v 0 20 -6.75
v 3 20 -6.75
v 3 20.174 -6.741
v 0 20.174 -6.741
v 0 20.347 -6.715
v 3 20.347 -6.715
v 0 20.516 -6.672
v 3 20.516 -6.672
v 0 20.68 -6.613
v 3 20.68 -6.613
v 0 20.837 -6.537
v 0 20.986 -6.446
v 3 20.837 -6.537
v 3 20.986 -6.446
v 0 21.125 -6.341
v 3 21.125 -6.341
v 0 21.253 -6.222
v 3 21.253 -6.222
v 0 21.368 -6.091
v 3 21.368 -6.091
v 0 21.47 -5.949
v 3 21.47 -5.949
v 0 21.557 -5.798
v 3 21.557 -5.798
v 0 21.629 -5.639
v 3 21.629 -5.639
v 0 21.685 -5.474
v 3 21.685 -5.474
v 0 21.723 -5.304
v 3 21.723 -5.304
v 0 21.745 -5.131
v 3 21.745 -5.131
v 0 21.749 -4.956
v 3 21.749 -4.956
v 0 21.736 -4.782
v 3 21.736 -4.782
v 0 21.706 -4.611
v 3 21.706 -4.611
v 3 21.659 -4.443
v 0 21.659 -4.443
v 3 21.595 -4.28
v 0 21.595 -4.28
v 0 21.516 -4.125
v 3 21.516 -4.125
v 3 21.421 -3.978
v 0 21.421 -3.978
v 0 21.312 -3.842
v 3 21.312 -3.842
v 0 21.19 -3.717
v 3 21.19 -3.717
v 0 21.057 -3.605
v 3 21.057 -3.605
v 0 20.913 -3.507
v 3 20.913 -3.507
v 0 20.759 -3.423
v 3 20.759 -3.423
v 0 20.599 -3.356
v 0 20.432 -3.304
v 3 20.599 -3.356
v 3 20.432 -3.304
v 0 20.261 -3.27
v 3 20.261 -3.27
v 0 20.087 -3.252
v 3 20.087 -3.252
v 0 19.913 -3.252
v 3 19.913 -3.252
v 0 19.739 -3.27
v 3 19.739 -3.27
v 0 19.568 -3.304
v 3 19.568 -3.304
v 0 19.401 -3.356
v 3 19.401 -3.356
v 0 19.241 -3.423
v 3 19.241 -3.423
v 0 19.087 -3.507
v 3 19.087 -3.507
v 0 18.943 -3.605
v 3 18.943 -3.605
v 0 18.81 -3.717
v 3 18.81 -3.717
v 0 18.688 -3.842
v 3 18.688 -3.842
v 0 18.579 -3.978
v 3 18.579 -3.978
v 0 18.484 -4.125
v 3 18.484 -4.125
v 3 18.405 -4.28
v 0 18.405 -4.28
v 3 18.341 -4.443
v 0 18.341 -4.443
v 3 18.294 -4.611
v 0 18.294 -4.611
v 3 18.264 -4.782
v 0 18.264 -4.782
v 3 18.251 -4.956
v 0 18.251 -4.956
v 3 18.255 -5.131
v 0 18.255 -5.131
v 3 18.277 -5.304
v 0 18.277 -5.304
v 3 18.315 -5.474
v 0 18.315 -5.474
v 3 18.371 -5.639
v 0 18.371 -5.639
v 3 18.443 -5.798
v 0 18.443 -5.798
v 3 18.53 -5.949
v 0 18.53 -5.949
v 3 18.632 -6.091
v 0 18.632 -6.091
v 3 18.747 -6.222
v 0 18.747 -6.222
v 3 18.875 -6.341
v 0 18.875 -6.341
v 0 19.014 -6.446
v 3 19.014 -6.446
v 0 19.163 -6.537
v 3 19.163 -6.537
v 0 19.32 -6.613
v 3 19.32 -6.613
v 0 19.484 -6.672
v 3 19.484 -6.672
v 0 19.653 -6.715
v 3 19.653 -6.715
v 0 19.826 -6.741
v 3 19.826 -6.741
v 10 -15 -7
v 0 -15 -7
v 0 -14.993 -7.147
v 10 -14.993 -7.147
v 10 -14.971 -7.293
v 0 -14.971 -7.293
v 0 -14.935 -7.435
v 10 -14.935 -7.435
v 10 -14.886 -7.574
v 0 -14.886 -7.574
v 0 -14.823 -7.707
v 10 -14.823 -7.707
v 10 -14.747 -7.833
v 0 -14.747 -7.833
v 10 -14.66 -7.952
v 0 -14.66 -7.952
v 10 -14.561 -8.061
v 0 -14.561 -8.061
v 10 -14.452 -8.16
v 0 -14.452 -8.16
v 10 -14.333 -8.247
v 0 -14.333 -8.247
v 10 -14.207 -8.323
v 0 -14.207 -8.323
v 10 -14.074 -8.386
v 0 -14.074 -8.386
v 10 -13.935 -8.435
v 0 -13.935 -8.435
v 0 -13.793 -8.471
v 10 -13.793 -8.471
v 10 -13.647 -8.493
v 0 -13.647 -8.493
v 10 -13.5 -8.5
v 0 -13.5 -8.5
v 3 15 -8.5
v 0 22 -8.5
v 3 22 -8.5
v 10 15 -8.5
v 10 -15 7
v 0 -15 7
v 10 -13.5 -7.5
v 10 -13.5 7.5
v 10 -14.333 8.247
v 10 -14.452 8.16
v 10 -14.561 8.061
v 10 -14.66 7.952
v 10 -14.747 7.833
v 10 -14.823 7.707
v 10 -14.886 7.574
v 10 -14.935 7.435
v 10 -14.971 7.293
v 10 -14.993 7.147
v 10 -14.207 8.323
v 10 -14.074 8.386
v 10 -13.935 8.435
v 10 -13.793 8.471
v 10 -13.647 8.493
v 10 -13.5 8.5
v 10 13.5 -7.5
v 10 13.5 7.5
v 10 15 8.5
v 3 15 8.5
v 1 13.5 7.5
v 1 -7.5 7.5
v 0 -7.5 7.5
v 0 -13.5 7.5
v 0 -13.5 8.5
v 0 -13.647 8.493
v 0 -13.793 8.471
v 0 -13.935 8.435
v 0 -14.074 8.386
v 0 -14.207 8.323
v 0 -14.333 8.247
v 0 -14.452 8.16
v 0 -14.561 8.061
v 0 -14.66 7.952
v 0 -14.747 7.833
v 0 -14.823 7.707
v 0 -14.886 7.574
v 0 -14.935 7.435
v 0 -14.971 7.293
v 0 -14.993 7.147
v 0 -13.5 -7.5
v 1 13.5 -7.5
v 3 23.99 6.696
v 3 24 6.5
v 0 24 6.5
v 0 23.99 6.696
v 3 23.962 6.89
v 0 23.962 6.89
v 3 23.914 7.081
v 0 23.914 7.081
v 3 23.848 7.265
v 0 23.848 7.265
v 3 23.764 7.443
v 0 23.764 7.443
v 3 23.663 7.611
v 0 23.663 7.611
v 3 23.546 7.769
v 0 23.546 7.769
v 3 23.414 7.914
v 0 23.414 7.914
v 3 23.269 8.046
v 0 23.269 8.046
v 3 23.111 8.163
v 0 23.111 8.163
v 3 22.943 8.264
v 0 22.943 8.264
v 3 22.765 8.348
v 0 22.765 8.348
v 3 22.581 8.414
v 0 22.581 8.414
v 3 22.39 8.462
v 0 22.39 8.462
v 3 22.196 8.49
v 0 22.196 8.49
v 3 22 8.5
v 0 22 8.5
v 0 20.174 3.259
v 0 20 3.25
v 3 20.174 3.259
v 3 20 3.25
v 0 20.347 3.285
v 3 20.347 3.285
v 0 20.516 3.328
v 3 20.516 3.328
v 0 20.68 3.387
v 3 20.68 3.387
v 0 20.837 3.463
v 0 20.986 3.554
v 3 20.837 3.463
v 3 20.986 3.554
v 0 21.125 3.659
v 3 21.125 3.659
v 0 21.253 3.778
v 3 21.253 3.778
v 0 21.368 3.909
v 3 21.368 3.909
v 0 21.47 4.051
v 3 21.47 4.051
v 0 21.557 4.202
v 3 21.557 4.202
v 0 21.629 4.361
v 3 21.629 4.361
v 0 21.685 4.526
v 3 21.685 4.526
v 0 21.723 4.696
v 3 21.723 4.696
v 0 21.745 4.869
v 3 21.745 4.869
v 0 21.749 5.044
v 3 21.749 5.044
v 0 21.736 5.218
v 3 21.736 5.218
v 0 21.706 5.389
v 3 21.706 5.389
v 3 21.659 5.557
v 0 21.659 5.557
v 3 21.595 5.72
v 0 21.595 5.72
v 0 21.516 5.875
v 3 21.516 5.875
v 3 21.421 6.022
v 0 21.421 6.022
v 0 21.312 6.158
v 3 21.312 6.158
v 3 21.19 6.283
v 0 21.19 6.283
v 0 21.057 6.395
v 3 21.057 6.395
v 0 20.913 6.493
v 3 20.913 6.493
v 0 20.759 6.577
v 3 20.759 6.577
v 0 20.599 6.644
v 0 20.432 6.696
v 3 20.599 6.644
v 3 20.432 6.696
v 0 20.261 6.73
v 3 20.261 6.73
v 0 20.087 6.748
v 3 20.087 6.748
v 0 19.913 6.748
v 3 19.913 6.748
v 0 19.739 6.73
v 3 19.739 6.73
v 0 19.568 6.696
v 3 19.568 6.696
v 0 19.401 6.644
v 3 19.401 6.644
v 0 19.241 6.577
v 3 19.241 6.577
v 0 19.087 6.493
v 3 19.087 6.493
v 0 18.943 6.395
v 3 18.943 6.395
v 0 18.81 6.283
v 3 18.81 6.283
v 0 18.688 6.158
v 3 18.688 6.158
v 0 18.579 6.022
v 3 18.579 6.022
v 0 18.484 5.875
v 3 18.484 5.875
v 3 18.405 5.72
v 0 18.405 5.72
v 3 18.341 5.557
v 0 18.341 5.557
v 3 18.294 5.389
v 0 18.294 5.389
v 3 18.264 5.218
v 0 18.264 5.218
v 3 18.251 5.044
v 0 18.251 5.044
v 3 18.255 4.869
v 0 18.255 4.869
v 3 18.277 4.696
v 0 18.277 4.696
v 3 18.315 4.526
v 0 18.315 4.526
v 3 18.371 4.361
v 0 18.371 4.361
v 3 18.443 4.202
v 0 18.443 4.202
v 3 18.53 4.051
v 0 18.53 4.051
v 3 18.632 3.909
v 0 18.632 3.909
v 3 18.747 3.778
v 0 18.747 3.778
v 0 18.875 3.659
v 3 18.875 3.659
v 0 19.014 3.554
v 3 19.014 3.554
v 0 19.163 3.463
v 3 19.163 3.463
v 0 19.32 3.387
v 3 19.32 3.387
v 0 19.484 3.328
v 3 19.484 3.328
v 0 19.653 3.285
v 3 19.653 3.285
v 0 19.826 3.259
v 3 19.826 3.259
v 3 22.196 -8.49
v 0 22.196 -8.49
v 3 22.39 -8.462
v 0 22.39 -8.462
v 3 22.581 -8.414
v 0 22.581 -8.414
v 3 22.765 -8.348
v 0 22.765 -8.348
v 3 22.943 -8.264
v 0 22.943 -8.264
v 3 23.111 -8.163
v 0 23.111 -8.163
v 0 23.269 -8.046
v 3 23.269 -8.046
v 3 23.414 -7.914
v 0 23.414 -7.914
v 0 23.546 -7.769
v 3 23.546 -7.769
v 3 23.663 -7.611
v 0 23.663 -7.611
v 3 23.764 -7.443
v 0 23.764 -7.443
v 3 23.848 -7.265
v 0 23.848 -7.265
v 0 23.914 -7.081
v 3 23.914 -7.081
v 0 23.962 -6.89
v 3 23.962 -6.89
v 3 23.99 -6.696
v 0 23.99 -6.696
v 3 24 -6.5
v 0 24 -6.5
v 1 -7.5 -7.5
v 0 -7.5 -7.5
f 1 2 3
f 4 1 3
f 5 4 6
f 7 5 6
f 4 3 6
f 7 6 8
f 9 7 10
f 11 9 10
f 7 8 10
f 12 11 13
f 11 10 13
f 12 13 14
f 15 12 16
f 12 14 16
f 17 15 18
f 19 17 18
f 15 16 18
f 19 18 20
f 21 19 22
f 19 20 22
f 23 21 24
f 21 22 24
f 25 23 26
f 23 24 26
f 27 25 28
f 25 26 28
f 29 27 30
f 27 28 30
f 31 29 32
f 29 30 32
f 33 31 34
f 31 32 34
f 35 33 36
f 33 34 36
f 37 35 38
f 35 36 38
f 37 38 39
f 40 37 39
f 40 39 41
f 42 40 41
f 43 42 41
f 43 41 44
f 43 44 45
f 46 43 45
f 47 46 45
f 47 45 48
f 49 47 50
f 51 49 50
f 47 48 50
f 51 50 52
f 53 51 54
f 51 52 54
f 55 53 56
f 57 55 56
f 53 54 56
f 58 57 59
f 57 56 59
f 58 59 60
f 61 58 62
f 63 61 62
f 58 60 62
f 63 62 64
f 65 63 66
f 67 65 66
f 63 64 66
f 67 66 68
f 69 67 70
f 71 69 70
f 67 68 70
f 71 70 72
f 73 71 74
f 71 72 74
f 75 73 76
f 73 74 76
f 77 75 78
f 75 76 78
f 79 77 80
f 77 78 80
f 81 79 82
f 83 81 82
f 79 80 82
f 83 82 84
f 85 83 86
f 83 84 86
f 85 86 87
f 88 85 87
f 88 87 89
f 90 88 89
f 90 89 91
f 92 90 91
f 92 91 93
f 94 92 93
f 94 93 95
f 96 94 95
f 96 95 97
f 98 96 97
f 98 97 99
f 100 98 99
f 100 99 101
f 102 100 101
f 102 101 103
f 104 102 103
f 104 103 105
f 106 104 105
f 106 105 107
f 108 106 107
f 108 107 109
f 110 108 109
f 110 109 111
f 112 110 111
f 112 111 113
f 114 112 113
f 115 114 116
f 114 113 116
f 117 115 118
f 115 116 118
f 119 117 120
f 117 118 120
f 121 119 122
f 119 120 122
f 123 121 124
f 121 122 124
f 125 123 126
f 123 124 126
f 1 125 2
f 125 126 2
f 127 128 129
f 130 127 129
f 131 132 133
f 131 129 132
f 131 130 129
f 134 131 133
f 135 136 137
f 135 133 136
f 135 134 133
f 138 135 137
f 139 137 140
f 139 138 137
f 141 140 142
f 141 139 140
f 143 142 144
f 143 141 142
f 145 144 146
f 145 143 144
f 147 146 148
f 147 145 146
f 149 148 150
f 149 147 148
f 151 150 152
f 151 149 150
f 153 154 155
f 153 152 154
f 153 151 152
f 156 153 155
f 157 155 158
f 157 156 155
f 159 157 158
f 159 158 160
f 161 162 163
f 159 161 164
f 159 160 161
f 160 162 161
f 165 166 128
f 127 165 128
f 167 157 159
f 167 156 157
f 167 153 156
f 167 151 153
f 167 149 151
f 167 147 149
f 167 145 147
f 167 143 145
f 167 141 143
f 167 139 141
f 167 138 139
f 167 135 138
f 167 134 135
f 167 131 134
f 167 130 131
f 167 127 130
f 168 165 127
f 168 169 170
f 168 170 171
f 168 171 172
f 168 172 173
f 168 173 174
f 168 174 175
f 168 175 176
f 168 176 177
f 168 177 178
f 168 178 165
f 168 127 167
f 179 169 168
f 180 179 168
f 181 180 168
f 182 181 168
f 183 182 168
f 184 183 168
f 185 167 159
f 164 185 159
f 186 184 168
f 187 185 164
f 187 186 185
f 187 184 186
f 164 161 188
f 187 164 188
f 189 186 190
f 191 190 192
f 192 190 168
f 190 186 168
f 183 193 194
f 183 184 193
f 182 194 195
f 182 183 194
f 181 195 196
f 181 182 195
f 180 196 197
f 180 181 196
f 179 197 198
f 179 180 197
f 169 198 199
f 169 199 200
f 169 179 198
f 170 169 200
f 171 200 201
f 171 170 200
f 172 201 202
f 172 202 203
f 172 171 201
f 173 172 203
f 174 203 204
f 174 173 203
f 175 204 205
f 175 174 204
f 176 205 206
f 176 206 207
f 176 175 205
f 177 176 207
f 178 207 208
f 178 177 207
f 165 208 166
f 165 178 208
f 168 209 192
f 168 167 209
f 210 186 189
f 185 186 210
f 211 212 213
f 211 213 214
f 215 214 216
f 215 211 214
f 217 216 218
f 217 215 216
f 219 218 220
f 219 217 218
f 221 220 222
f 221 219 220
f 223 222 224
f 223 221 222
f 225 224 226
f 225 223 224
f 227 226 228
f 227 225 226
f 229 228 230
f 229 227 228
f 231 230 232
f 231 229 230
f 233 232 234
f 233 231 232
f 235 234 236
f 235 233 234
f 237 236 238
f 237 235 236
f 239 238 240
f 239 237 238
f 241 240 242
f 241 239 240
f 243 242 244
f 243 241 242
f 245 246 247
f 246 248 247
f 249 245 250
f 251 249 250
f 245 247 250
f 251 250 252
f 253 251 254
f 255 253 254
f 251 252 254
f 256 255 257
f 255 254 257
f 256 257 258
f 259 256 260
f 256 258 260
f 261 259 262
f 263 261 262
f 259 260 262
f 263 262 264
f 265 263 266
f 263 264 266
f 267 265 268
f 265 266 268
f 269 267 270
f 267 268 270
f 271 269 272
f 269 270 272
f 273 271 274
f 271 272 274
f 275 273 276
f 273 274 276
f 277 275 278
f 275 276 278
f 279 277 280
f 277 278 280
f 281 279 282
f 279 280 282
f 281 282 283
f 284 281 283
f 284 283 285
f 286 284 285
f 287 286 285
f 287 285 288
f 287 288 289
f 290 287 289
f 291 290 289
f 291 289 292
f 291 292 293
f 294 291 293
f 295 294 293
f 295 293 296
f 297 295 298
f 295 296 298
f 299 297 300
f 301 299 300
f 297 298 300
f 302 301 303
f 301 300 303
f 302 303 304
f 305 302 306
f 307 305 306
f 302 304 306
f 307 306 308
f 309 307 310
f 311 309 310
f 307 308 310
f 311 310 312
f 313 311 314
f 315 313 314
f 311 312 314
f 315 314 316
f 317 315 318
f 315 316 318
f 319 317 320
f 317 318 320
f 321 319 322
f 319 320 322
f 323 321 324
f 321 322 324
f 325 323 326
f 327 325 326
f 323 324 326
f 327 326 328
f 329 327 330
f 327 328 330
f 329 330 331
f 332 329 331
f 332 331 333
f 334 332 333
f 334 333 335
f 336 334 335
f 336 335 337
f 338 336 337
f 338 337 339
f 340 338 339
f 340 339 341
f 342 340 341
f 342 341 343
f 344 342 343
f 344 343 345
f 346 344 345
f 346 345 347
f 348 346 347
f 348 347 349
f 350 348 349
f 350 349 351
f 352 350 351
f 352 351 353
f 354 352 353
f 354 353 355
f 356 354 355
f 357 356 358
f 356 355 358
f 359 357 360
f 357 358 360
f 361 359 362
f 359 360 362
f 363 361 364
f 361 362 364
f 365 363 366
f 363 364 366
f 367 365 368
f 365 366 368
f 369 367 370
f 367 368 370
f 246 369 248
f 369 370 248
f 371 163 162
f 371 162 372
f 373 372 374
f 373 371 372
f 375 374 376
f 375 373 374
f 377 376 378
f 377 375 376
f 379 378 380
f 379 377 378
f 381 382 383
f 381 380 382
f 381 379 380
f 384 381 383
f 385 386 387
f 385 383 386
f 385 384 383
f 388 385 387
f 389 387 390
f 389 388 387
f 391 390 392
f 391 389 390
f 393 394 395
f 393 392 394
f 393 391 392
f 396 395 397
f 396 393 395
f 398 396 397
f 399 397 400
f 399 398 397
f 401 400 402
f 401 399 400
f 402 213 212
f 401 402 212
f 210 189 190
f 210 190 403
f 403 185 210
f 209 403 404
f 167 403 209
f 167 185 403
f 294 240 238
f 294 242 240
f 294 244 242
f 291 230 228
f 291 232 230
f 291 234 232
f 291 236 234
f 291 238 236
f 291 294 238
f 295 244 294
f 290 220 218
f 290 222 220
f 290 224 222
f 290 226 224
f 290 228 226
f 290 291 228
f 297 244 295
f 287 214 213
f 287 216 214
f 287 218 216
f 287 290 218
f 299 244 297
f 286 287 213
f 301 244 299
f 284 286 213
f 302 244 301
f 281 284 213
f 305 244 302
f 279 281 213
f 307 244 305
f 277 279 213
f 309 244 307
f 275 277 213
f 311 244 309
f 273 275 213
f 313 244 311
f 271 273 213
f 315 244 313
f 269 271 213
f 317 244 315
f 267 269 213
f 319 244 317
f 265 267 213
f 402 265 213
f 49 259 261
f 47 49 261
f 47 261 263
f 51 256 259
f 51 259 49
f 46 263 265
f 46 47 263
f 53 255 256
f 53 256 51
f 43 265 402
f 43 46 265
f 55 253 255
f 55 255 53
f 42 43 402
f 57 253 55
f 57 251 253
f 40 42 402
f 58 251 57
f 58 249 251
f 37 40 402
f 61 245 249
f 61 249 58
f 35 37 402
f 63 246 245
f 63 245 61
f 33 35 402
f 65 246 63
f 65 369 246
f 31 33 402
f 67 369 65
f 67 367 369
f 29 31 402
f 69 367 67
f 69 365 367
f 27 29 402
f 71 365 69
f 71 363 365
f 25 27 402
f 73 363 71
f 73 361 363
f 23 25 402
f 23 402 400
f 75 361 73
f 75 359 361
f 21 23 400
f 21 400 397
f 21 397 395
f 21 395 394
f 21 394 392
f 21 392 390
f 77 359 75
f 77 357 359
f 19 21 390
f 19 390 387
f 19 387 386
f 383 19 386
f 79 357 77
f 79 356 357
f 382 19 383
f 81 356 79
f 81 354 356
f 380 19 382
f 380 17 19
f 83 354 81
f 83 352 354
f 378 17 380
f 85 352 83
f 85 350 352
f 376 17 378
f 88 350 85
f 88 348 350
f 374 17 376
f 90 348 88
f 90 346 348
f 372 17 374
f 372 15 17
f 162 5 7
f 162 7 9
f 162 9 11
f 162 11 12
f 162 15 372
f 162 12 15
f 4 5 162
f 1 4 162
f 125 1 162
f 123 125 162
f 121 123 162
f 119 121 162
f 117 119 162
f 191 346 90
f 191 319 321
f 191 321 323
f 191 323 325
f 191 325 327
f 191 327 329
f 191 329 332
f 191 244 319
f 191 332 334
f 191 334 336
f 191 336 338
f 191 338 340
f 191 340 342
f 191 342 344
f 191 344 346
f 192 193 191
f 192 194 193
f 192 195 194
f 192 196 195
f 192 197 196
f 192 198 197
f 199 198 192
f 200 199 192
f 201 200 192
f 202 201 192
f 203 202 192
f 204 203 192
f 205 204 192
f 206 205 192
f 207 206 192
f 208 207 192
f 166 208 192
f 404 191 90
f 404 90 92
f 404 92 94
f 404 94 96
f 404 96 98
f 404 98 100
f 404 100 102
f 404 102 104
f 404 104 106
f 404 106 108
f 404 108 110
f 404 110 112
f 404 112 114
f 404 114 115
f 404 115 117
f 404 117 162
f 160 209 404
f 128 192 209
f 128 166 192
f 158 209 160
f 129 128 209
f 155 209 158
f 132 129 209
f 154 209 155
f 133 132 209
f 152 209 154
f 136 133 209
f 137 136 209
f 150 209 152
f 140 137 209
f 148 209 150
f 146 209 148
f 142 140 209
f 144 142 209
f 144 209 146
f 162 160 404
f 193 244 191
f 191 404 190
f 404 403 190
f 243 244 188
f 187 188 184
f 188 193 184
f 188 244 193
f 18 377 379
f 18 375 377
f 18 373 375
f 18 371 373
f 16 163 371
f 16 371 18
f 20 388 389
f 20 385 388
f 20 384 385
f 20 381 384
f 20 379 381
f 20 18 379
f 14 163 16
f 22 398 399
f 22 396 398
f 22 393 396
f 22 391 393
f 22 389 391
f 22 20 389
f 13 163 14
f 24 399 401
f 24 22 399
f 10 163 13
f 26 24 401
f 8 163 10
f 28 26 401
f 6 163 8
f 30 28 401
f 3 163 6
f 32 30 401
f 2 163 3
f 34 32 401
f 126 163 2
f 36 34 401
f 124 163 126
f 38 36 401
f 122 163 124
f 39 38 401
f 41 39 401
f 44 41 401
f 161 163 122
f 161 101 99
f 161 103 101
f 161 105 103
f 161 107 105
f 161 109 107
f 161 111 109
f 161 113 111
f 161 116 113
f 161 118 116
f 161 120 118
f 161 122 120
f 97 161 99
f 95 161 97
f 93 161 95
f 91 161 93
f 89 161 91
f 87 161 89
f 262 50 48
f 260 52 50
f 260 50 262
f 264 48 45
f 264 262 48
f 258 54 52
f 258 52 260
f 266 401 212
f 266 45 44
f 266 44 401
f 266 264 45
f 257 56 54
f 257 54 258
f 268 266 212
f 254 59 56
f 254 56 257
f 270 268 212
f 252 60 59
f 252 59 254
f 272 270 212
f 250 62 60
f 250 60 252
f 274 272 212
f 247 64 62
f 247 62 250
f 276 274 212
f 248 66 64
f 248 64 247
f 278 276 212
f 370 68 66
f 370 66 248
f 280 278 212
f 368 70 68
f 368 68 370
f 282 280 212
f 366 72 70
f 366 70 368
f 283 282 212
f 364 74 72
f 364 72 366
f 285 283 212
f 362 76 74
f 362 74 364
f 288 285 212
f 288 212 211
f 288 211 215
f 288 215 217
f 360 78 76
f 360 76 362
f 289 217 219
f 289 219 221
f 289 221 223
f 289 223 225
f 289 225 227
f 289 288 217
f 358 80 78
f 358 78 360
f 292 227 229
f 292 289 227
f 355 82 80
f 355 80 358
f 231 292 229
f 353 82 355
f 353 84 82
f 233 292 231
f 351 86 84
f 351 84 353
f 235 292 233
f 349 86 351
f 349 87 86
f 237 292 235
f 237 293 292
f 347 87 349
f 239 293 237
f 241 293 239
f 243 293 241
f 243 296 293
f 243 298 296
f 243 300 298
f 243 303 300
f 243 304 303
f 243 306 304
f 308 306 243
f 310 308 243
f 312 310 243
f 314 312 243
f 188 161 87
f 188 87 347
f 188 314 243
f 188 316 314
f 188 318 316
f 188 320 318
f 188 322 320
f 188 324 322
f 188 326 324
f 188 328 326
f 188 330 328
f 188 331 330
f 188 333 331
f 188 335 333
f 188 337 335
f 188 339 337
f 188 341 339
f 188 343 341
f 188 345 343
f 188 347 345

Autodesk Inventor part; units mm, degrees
ref_plane "YZ Plane" through (0, 0, 0) normal (1, 0, 0) x (0, 1, 0)
ref_plane "XZ Plane" through (0, 0, 0) normal (0, 1, 0) x (-1, 0, 0)
ref_plane "XY Plane" through (0, 0, 0) normal (0, 0, 1) x (1, 0, 0)
sketch "Esquisse1" plane through (0, 0, 0) normal (1, 0, 0) x (0, 1, 0)
  line L0 (15, 8.5) -> (-15, 8.5)
  line L1 (-15, 8.5) -> (-15, -8.5)
  line L2 (-15, -8.5) -> (15, -8.5)
  line L3 (15, -8.5) -> (15, 8.5)
  point P0 (0, 0)
  point P1 (0, 0)
  point P2 (0, 0)
  dimension "d4" = 30
  dimension "d5" = 17
extrude "Extrusion1" add sketch "Esquisse1" along normal blind 10
sketch "Esquisse2" plane through (10, 0, 0) normal (1, 0, 0) x (0, 0, -1)
  line L0 (-7.5, 13.5) -> (7.5, 13.5)
  line L1 (7.5, 13.5) -> (7.5, -13.5)
  line L2 (7.5, -13.5) -> (-7.5, -13.5)
  line L3 (-7.5, -13.5) -> (-7.5, 13.5)
  line L4 (-7.5, 13.5) -> (7.5, -13.5)
  line L5 (-7.5, -13.5) -> (7.5, 13.5)
  point P0 (0, 0)
  point P1 (0, 0)
  point P2 (0, 0)
  dimension "d8" = 27
  dimension "d9" = 15
extrude "Extrusion2" cut sketch "Esquisse2" against normal blind 9
sketch "Esquisse3" plane through (1, 0, 0) normal (1, 0, 0) x (0, 0, -1)
  line L0 (7.5, -13.5) -> (-7.5, -13.5) projected
  line L1 (7.5, 13.5) -> (7.5, -13.5) projected
  line L2 (-7.5, -13.5) -> (7.5, -13.5)
  line L3 (7.5, -13.5) -> (7.5, -7.5)
  line L4 (7.5, -7.5) -> (-7.5, -7.5)
  line L5 (-7.5, -7.5) -> (-7.5, -13.5)
  point P0 (0, 0)
  dimension "d12" = 6
extrude "Extrusion3" cut sketch "Esquisse3" against normal blind 9
sketch "Esquisse4" plane through (0, 15, 8.5) normal (0, 1, 0) x (1, 0, 0)
  line L0 (0, 0) -> (0, 17) projected
  line L1 (0, 0) -> (10, 0) projected
  line L2 (0, 17) -> (3, 17)
  line L3 (3, 17) -> (3, 0)
  line L4 (3, 0) -> (0, 0)
  line L5 (0, 0) -> (0, 17)
  point P0 (0, 8.5)
extrude "Extrusion4" add sketch "Esquisse4" along normal blind 9
sketch "Esquisse5" plane through (3, 15, 8.5) normal (1, 0, 0) x (0, 0, -1)
  circle A0 centre (13.5, 5) radius 1.75
  line L0 (17, 9) -> (0, 9) projected
  line L1 (8.5, 9) -> (8.5, 0)
  line L2 (17, 0) -> (0, 0) projected
  circle A1 centre (3.5, 5) radius 1.75
  point P0 (8.5, -15)
  dimension "d17" = 3.5
  dimension "d18" = 5
  dimension "d19" = 4
extrude "Extrusion5" cut sketch "Esquisse5" against normal blind 3
fillet "Congé1" radius 2 2 edges at (1.5, 24, -8.5) (1.5, 24, 8.5)
fillet "Congé2" radius 1.5 2 edges at (5, -15, 8.5) (5, -15, -8.5)
properties part number "support_tof_actionneur_panneaux_solaires_Impression 3D"
